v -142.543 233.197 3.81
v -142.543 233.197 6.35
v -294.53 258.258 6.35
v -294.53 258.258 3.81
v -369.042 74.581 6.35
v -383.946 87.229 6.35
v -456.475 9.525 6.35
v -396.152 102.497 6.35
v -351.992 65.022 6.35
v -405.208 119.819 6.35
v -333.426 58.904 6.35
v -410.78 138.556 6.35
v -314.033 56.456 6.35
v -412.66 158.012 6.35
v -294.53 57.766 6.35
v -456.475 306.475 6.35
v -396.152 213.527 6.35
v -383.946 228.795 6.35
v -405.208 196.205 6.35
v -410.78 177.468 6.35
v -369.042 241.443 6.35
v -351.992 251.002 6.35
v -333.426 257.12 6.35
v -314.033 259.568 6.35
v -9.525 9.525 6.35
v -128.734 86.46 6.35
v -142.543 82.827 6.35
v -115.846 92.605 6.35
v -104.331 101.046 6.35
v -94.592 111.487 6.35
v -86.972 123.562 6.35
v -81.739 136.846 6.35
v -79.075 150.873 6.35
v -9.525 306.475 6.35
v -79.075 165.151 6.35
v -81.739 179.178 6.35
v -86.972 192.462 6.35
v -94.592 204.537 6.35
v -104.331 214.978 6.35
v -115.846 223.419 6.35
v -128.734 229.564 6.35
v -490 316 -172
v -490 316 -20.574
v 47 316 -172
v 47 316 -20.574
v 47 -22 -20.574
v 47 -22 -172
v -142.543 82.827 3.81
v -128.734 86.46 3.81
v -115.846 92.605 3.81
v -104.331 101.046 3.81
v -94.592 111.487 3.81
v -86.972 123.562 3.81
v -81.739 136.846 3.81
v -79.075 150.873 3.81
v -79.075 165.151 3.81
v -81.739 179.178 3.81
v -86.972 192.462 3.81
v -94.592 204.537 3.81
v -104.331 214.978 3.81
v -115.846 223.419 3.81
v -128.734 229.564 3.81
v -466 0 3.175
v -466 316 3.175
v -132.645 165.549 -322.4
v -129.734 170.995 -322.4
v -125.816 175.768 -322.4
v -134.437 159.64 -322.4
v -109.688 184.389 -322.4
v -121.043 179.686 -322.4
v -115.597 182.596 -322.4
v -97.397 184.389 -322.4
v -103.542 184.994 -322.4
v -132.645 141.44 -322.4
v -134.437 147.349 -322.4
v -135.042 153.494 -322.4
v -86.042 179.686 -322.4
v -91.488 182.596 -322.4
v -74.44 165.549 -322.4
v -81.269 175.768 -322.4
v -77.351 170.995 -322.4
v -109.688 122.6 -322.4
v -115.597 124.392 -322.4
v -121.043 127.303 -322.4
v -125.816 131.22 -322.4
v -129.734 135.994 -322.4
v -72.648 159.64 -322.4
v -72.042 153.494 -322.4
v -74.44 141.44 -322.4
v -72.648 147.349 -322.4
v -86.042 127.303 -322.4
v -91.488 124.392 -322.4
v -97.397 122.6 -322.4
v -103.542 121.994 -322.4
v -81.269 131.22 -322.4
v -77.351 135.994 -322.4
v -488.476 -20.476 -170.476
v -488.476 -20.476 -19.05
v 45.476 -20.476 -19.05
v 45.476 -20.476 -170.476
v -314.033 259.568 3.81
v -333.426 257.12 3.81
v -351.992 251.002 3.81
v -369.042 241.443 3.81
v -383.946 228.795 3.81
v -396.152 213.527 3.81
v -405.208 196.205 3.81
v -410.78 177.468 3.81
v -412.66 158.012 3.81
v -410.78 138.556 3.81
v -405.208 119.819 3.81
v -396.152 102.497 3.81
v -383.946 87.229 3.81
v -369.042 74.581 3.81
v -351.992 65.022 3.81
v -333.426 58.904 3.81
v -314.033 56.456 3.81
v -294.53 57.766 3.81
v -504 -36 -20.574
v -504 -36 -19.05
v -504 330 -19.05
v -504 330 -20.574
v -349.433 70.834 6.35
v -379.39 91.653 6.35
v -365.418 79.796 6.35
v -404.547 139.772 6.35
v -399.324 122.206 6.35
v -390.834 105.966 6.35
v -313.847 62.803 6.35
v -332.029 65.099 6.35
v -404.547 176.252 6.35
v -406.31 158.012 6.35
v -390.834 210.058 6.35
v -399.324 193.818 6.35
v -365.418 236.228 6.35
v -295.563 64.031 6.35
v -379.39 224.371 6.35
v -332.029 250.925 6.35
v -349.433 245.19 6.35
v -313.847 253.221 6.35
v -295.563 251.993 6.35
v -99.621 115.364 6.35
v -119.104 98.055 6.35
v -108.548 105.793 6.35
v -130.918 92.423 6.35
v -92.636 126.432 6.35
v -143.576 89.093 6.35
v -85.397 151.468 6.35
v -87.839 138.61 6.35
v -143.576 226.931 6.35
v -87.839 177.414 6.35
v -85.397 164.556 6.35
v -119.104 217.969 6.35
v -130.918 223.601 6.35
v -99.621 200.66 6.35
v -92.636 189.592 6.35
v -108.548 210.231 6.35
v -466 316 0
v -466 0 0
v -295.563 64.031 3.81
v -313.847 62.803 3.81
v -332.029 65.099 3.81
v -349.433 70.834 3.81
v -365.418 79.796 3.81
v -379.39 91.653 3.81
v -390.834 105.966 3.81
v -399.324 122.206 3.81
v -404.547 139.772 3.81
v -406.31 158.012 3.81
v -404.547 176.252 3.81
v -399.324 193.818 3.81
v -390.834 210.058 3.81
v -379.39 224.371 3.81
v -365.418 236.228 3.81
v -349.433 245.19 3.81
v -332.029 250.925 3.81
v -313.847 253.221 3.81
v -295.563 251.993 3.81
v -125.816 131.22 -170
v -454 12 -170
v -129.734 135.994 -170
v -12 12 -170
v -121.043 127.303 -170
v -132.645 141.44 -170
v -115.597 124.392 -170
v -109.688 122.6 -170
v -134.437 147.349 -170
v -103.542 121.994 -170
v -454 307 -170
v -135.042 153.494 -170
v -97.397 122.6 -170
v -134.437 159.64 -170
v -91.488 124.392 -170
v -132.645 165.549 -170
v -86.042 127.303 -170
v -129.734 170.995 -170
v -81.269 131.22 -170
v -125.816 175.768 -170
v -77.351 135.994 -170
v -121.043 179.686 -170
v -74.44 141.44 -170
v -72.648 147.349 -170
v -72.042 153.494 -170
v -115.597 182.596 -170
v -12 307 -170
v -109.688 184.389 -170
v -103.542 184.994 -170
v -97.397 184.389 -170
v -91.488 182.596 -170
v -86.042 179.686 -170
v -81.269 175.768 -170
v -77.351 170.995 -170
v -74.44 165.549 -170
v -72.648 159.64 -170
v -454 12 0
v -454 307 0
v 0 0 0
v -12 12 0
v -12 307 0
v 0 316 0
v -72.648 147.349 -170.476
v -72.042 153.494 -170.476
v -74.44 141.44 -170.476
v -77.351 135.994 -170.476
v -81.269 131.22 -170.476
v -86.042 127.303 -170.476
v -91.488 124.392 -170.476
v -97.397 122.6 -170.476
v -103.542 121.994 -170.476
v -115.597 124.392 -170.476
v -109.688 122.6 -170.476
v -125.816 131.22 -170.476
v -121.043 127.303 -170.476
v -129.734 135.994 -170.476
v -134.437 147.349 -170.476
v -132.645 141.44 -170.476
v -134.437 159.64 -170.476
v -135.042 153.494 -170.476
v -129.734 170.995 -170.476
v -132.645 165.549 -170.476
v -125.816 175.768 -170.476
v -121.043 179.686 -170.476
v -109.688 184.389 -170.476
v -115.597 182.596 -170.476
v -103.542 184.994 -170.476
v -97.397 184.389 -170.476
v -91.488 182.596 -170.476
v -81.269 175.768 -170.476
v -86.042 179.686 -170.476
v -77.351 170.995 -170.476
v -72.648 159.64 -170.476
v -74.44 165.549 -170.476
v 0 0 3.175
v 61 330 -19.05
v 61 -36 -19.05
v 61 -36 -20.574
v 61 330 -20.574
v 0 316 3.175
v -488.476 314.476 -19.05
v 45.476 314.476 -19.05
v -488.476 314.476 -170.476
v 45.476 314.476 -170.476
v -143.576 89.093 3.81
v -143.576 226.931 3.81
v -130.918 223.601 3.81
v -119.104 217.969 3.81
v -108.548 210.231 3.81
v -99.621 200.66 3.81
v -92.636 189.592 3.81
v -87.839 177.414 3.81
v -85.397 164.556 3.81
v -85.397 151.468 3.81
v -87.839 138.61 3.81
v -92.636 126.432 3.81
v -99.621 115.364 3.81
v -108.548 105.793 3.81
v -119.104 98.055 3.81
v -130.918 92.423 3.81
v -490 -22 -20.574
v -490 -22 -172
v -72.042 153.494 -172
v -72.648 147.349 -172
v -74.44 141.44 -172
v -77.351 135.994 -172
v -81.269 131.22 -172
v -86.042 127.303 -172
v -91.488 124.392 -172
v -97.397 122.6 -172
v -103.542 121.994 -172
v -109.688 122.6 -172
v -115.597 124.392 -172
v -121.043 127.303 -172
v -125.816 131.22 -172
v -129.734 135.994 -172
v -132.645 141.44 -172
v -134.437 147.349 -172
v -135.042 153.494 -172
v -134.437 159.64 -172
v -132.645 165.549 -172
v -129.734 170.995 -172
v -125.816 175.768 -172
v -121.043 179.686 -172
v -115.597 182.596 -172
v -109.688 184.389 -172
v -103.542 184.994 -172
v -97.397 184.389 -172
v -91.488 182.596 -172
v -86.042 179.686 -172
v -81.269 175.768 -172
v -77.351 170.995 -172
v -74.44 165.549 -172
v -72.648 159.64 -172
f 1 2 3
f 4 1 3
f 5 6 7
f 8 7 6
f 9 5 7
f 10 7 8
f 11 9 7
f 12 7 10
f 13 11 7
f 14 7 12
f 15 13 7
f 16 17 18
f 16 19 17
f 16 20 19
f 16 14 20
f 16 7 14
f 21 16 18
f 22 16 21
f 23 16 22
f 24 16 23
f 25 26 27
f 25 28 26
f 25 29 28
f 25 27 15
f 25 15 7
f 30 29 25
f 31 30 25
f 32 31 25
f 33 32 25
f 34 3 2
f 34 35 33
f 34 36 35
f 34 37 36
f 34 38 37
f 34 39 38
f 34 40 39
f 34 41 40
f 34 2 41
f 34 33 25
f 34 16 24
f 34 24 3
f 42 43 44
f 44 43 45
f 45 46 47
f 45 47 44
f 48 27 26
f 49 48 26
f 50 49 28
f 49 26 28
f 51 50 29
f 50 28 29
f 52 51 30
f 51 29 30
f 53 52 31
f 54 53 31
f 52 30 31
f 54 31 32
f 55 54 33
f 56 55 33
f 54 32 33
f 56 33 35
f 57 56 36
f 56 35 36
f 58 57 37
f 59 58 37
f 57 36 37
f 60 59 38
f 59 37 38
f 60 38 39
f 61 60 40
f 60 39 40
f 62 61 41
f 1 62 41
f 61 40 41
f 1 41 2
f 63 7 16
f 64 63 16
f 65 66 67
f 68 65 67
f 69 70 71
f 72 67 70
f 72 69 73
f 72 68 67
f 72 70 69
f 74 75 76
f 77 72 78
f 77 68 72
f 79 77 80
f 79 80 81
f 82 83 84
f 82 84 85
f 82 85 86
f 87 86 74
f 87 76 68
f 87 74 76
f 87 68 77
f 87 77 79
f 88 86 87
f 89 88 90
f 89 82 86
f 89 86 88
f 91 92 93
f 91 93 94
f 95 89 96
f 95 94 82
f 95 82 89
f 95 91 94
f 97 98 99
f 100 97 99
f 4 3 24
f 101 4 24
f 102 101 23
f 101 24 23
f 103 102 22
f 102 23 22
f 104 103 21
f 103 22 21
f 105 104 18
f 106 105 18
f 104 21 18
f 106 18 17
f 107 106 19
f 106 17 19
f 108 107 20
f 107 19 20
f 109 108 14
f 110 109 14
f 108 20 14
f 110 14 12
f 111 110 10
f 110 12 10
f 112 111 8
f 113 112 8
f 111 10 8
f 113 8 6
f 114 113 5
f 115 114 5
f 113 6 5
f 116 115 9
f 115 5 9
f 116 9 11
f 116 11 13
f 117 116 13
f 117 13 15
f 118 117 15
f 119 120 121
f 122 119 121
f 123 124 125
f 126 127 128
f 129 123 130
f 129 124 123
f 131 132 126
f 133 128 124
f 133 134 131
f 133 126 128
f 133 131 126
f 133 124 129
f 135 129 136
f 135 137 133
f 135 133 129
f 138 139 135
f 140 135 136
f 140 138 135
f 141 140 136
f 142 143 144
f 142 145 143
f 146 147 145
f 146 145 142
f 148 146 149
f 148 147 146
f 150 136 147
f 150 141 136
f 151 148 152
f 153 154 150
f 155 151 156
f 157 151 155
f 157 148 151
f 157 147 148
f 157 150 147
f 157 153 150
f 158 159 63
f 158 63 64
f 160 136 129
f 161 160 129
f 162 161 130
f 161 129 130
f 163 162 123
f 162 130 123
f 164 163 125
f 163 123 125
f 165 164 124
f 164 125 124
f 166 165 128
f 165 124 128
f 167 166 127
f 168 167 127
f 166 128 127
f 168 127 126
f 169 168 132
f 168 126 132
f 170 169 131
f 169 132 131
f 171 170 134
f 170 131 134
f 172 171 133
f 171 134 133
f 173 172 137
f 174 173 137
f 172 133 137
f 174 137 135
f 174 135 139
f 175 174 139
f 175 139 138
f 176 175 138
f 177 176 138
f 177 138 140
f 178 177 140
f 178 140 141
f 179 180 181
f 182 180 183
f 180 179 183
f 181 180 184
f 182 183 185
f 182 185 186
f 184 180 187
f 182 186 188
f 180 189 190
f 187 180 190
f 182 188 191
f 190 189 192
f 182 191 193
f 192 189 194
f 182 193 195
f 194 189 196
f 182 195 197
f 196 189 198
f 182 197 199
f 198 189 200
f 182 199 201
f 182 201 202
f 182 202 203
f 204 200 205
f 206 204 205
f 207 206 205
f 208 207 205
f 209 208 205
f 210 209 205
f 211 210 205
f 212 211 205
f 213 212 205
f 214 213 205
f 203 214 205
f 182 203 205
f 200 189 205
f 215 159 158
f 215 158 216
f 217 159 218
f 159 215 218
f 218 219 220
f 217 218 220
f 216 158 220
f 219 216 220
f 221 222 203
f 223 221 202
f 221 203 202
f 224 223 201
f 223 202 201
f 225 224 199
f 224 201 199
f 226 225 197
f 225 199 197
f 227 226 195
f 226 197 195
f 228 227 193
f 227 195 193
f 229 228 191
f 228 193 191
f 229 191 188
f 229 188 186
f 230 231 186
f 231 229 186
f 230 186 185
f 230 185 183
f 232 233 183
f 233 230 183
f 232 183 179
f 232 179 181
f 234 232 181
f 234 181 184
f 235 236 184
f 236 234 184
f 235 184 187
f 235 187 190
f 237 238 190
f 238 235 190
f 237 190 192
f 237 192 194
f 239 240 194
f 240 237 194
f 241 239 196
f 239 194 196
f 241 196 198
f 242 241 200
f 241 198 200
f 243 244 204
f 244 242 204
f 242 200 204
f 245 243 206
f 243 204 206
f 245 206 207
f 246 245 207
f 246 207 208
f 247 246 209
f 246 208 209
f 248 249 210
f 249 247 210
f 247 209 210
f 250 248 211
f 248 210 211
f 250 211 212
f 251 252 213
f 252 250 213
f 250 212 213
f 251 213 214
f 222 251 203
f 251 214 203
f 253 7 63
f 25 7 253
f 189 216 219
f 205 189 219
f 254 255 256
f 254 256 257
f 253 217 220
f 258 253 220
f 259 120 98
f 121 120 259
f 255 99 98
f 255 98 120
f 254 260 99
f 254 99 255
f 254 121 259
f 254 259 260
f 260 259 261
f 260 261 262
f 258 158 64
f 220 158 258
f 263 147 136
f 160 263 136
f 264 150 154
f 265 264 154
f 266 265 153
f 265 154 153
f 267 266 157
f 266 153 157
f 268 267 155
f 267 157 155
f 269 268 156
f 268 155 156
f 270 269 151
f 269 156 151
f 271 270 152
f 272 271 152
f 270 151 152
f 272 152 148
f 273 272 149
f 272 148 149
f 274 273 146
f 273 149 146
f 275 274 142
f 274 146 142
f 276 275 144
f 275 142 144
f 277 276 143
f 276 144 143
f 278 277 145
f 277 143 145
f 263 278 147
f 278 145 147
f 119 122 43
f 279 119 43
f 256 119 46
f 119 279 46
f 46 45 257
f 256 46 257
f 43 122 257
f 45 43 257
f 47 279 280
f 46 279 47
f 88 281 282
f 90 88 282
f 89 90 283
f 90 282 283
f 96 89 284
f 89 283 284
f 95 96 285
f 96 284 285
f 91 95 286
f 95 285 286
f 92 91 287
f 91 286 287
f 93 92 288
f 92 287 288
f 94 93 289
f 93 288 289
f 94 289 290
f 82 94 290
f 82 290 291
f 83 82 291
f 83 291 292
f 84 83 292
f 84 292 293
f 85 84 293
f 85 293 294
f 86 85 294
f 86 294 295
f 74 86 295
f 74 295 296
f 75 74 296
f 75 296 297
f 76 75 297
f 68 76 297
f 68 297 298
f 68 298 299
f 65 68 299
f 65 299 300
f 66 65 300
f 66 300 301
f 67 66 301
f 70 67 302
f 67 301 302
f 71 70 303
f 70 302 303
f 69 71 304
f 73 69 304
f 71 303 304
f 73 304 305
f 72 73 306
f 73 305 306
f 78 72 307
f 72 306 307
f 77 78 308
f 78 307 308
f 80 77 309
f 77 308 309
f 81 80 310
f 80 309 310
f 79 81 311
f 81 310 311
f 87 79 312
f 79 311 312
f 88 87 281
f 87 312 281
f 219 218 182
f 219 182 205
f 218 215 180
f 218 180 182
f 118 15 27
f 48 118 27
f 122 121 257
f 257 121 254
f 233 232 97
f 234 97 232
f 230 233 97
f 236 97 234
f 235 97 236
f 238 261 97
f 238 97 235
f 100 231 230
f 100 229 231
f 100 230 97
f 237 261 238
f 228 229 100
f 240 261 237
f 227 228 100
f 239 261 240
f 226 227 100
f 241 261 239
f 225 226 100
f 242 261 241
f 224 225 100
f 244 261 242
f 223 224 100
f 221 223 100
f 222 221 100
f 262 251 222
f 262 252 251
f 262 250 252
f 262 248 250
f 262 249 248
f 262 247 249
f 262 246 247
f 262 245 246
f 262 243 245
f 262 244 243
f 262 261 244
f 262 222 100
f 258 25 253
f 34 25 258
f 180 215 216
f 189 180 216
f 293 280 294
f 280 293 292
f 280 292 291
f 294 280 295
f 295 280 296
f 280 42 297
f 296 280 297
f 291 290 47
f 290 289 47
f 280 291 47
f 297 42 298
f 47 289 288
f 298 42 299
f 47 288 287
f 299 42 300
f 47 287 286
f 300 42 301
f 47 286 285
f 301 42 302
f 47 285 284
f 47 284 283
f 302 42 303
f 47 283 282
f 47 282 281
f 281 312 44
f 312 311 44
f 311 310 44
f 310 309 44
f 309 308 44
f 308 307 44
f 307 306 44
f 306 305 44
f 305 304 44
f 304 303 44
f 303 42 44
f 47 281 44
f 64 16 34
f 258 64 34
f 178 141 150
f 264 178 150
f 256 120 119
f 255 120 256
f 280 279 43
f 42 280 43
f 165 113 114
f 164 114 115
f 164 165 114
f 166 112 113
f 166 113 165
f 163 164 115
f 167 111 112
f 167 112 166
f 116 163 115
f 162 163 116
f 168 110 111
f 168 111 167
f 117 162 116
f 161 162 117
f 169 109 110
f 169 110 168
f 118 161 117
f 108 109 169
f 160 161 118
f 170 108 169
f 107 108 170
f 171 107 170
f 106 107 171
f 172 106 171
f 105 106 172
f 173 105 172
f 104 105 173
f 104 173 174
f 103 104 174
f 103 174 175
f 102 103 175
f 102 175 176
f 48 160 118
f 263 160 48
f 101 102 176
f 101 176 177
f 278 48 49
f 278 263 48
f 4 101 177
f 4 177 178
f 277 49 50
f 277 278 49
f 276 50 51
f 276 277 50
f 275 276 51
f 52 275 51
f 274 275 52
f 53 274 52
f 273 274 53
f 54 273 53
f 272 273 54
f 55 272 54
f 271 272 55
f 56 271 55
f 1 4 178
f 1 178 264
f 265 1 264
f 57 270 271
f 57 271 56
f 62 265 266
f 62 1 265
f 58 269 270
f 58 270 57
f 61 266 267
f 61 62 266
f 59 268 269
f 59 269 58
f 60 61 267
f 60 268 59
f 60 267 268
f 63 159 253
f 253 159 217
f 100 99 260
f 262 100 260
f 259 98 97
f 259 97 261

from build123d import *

# Parameters (mm, degrees)
F0_W      = 466
F0_H      = 316
F1_DEPTH  = 6.35
F2_SIZE2  = 9.525
F2_SIZE   = 3.175
F4_DEPTH  = 2.54
F5_W      = 442
F5_H      = 295
F6_DEPTH  = 170
F7_R      = 31.5
F8_DEPTH  = 152.4
F10_START = -19.05
F9_W      = 537
F9_H      = 338
F10_DEPTH = 152.95
F11_T     = -1.524
F12_START = -19.05
F9_W_2    = 565
F9_H_2    = 366
F12_DEPTH = 1.524


with BuildPart() as f1:
    # F0 (on Top) → F1 (new body)
    with BuildSketch(Plane.XY):
        with Locations((-233, 158)):
            Rectangle(F0_W, F0_H)
    extrude(amount=F1_DEPTH)

    # F2
    f2_edges = [f1.edges().sort_by_distance(p)[0] for p in [
        (-233, 0, 6.35),
        (0, 158, 6.35),
        (-233, 316, 6.35),
        (-466, 158, 6.35),
    ]]
    chamfer(f2_edges, length=F2_SIZE, length2=F2_SIZE2)

    # F3 (on face) → F4 (cut)
    with BuildSketch(Plane.XY.offset(6.35)):
        with BuildLine():
            Line((-142.5426133743, 233.1967378452), (-294.5301511658, 258.258317127))
            ThreePointArc((-294.5301511658, 258.258317127), (-412.66, 158.012), (-294.5301511658, 57.765682873))
            Line((-294.5301511658, 57.765682873), (-142.5426133743, 82.8272621548))
            ThreePointArc((-142.5426133743, 82.8272621548), (-78.74, 158.012), (-142.5426133743, 233.1967378452))
        make_face()
        with BuildLine():
            Line((-143.5757292344, 89.0926588426), (-295.5632670258, 64.0310795608))
            ThreePointArc((-295.5632670258, 64.0310795608), (-406.3099981074, 158.012), (-295.5632670258, 251.9929204392))
            Line((-295.5632670258, 251.9929204392), (-143.5757292344, 226.9313411574))
            ThreePointArc((-143.5757292344, 226.9313411574), (-85.0900018926, 158.012), (-143.5757292344, 89.0926588426))
        make_face(mode=Mode.SUBTRACT)
    extrude(amount=-F4_DEPTH, mode=Mode.SUBTRACT)

    # F5 (on Top) → F6 (join)
    with BuildSketch(Plane.XY):
        with Locations((-233, 159.5)):
            Rectangle(F5_W, F5_H)
    extrude(amount=-F6_DEPTH)

    # F7 (on face) → F8 (join)
    with BuildSketch(Plane(origin=(0, 0, -170), x_dir=(1, 0, 0), z_dir=(0, 0, -1))):
        with Locations((-103.5423949361, -153.4942388535)):
            Circle(F7_R)
    extrude(amount=F8_DEPTH)



with BuildPart() as f10:
    # F9 (on Top) → F10 (new body)
    with BuildSketch(Plane.XY.offset(F10_START)):
        with Locations((-221.5, 147)):
            Rectangle(F9_W, F9_H)
    extrude(amount=-F10_DEPTH)

    # F11
    f11_openings = [f10.faces().sort_by_distance(p)[0] for p in [
        (-221.5, 147, -19.05),
    ]]
    offset(amount=F11_T, openings=f11_openings)


with BuildPart() as f1_1:
    add(f1.part)

    add(f10.part)  # F12 merges F10
    # F9 (on Top) → F12 (join)
    with BuildSketch(Plane.XY.offset(F12_START)):
        with Locations((-221.5, 147)):
            Rectangle(F9_W_2, F9_H_2)
        with Locations((-221.5, 147)):
            Rectangle(F9_W, F9_H, mode=Mode.SUBTRACT)
    extrude(amount=-F12_DEPTH)


solid = f1_1.part
